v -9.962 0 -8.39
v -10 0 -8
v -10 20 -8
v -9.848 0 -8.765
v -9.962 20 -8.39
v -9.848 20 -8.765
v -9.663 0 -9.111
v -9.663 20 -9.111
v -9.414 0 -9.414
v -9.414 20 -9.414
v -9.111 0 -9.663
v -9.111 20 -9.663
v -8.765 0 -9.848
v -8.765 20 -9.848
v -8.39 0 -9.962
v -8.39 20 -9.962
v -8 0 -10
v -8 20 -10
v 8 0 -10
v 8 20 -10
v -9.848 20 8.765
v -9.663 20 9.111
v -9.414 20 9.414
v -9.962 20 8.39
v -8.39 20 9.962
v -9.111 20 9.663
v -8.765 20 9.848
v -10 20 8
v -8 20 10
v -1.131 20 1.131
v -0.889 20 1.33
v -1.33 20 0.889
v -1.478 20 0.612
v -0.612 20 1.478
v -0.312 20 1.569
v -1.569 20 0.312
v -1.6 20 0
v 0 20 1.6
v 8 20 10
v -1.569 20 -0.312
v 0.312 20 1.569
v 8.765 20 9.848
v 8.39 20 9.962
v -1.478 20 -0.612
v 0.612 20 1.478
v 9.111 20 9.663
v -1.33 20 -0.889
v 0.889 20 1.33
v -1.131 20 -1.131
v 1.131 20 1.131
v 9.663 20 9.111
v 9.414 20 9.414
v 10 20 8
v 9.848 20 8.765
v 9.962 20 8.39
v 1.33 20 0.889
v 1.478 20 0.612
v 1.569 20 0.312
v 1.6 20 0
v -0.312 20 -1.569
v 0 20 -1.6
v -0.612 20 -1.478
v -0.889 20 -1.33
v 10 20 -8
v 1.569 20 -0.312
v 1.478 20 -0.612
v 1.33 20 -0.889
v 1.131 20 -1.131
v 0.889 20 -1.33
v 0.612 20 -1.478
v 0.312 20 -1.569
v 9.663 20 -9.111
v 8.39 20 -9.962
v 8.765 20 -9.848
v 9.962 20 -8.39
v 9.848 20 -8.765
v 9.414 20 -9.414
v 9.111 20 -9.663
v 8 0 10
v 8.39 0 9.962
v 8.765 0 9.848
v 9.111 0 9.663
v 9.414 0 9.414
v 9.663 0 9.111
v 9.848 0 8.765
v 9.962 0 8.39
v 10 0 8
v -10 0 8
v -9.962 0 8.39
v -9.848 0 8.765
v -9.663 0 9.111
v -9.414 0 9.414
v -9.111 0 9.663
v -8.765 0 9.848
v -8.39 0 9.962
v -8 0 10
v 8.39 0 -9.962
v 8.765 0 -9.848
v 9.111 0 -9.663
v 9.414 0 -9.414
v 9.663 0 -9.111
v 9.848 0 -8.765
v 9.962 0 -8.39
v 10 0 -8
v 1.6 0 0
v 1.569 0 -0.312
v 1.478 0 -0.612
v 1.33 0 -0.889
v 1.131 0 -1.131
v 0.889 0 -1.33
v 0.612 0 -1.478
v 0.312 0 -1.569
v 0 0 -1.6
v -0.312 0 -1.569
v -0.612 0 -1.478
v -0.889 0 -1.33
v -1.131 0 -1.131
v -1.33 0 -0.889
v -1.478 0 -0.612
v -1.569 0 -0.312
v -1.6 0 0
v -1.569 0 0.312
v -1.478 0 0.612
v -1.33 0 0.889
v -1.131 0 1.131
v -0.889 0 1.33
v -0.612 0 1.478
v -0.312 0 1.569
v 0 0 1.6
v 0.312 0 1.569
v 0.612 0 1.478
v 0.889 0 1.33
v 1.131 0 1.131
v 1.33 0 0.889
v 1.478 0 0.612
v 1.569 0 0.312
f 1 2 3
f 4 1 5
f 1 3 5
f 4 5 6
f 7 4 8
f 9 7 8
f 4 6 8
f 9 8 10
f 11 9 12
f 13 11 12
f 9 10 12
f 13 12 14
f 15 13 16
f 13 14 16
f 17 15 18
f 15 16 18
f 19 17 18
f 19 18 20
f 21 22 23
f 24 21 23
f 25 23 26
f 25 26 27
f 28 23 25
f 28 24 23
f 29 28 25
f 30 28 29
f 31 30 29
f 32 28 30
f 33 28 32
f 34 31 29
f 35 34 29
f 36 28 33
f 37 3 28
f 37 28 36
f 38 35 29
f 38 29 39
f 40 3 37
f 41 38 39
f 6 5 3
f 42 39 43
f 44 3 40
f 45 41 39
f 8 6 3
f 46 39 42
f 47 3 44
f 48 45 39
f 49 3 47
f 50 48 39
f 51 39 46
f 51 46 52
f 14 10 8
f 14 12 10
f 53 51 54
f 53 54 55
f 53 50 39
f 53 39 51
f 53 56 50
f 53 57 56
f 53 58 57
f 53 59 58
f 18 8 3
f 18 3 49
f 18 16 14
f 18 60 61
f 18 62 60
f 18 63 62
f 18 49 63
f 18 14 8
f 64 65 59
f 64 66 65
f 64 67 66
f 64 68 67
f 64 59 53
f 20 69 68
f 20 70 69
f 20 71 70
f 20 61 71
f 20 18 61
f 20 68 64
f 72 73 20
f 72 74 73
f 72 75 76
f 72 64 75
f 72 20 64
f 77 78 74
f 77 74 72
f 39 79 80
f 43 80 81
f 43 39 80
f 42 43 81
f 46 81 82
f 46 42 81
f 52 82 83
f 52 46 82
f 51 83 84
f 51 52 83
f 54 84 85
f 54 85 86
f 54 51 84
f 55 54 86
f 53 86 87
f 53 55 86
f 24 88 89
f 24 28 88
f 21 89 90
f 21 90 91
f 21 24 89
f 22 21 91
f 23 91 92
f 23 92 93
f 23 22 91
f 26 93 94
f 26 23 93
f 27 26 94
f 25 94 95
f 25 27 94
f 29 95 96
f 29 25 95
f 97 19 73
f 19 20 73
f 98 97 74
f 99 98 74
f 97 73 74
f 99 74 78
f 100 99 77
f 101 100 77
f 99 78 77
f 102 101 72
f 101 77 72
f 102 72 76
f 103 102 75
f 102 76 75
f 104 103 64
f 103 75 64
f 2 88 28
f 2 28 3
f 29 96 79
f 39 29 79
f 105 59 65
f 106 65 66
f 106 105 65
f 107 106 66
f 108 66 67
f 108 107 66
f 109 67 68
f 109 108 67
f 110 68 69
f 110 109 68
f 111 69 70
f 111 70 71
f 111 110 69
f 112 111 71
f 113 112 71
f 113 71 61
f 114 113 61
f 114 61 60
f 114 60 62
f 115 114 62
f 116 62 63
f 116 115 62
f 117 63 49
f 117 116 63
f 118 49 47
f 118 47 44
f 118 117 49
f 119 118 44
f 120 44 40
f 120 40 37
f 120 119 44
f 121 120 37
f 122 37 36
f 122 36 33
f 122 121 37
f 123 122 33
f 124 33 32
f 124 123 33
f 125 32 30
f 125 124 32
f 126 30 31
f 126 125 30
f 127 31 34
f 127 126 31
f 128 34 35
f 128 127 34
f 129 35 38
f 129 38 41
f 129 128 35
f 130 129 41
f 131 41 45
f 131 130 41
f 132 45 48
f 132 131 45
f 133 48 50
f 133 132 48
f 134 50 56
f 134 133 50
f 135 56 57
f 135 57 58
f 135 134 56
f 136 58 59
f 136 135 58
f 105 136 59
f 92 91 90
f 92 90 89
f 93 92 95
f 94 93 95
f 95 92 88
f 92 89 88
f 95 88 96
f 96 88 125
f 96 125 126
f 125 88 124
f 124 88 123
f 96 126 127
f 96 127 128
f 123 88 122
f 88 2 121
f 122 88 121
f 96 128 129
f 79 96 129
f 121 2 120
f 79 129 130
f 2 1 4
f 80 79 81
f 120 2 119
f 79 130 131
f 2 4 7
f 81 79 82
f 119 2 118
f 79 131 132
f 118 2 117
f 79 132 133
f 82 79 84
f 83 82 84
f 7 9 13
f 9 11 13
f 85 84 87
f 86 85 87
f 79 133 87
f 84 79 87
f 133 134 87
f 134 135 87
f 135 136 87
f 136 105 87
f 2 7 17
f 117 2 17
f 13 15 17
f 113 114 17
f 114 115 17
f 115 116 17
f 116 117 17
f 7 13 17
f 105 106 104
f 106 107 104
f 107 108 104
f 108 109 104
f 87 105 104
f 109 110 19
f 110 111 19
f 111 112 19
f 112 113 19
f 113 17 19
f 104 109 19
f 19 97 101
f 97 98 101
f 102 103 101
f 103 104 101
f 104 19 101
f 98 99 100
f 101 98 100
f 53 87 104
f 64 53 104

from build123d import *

# Parameters (mm, degrees)
SKETCH_1_W      = 20
SKETCH_1_H      = 20
SKETCH_1_R      = 1.6
EXTRUDE_1_DEPTH = 20
FILLET_1_R      = 2


with BuildPart() as part:
    # 草图1 → 凸台-拉伸1 (new body)
    with BuildSketch(Plane(origin=(0, 0, 0), x_dir=(1, 0, 0), z_dir=(0, 1, 0))):
        Rectangle(SKETCH_1_W, SKETCH_1_H)
        Circle(SKETCH_1_R, mode=Mode.SUBTRACT)
    extrude(amount=EXTRUDE_1_DEPTH)

    # 圆角1
    fillet_1_edges = [part.edges().sort_by_distance(p)[0] for p in [
        (10, 10, 10),
        (-10, 10, 10),
        (-10, 10, -10),
        (10, 10, -10),
    ]]
    fillet(fillet_1_edges, radius=FILLET_1_R)


solid = part.part
